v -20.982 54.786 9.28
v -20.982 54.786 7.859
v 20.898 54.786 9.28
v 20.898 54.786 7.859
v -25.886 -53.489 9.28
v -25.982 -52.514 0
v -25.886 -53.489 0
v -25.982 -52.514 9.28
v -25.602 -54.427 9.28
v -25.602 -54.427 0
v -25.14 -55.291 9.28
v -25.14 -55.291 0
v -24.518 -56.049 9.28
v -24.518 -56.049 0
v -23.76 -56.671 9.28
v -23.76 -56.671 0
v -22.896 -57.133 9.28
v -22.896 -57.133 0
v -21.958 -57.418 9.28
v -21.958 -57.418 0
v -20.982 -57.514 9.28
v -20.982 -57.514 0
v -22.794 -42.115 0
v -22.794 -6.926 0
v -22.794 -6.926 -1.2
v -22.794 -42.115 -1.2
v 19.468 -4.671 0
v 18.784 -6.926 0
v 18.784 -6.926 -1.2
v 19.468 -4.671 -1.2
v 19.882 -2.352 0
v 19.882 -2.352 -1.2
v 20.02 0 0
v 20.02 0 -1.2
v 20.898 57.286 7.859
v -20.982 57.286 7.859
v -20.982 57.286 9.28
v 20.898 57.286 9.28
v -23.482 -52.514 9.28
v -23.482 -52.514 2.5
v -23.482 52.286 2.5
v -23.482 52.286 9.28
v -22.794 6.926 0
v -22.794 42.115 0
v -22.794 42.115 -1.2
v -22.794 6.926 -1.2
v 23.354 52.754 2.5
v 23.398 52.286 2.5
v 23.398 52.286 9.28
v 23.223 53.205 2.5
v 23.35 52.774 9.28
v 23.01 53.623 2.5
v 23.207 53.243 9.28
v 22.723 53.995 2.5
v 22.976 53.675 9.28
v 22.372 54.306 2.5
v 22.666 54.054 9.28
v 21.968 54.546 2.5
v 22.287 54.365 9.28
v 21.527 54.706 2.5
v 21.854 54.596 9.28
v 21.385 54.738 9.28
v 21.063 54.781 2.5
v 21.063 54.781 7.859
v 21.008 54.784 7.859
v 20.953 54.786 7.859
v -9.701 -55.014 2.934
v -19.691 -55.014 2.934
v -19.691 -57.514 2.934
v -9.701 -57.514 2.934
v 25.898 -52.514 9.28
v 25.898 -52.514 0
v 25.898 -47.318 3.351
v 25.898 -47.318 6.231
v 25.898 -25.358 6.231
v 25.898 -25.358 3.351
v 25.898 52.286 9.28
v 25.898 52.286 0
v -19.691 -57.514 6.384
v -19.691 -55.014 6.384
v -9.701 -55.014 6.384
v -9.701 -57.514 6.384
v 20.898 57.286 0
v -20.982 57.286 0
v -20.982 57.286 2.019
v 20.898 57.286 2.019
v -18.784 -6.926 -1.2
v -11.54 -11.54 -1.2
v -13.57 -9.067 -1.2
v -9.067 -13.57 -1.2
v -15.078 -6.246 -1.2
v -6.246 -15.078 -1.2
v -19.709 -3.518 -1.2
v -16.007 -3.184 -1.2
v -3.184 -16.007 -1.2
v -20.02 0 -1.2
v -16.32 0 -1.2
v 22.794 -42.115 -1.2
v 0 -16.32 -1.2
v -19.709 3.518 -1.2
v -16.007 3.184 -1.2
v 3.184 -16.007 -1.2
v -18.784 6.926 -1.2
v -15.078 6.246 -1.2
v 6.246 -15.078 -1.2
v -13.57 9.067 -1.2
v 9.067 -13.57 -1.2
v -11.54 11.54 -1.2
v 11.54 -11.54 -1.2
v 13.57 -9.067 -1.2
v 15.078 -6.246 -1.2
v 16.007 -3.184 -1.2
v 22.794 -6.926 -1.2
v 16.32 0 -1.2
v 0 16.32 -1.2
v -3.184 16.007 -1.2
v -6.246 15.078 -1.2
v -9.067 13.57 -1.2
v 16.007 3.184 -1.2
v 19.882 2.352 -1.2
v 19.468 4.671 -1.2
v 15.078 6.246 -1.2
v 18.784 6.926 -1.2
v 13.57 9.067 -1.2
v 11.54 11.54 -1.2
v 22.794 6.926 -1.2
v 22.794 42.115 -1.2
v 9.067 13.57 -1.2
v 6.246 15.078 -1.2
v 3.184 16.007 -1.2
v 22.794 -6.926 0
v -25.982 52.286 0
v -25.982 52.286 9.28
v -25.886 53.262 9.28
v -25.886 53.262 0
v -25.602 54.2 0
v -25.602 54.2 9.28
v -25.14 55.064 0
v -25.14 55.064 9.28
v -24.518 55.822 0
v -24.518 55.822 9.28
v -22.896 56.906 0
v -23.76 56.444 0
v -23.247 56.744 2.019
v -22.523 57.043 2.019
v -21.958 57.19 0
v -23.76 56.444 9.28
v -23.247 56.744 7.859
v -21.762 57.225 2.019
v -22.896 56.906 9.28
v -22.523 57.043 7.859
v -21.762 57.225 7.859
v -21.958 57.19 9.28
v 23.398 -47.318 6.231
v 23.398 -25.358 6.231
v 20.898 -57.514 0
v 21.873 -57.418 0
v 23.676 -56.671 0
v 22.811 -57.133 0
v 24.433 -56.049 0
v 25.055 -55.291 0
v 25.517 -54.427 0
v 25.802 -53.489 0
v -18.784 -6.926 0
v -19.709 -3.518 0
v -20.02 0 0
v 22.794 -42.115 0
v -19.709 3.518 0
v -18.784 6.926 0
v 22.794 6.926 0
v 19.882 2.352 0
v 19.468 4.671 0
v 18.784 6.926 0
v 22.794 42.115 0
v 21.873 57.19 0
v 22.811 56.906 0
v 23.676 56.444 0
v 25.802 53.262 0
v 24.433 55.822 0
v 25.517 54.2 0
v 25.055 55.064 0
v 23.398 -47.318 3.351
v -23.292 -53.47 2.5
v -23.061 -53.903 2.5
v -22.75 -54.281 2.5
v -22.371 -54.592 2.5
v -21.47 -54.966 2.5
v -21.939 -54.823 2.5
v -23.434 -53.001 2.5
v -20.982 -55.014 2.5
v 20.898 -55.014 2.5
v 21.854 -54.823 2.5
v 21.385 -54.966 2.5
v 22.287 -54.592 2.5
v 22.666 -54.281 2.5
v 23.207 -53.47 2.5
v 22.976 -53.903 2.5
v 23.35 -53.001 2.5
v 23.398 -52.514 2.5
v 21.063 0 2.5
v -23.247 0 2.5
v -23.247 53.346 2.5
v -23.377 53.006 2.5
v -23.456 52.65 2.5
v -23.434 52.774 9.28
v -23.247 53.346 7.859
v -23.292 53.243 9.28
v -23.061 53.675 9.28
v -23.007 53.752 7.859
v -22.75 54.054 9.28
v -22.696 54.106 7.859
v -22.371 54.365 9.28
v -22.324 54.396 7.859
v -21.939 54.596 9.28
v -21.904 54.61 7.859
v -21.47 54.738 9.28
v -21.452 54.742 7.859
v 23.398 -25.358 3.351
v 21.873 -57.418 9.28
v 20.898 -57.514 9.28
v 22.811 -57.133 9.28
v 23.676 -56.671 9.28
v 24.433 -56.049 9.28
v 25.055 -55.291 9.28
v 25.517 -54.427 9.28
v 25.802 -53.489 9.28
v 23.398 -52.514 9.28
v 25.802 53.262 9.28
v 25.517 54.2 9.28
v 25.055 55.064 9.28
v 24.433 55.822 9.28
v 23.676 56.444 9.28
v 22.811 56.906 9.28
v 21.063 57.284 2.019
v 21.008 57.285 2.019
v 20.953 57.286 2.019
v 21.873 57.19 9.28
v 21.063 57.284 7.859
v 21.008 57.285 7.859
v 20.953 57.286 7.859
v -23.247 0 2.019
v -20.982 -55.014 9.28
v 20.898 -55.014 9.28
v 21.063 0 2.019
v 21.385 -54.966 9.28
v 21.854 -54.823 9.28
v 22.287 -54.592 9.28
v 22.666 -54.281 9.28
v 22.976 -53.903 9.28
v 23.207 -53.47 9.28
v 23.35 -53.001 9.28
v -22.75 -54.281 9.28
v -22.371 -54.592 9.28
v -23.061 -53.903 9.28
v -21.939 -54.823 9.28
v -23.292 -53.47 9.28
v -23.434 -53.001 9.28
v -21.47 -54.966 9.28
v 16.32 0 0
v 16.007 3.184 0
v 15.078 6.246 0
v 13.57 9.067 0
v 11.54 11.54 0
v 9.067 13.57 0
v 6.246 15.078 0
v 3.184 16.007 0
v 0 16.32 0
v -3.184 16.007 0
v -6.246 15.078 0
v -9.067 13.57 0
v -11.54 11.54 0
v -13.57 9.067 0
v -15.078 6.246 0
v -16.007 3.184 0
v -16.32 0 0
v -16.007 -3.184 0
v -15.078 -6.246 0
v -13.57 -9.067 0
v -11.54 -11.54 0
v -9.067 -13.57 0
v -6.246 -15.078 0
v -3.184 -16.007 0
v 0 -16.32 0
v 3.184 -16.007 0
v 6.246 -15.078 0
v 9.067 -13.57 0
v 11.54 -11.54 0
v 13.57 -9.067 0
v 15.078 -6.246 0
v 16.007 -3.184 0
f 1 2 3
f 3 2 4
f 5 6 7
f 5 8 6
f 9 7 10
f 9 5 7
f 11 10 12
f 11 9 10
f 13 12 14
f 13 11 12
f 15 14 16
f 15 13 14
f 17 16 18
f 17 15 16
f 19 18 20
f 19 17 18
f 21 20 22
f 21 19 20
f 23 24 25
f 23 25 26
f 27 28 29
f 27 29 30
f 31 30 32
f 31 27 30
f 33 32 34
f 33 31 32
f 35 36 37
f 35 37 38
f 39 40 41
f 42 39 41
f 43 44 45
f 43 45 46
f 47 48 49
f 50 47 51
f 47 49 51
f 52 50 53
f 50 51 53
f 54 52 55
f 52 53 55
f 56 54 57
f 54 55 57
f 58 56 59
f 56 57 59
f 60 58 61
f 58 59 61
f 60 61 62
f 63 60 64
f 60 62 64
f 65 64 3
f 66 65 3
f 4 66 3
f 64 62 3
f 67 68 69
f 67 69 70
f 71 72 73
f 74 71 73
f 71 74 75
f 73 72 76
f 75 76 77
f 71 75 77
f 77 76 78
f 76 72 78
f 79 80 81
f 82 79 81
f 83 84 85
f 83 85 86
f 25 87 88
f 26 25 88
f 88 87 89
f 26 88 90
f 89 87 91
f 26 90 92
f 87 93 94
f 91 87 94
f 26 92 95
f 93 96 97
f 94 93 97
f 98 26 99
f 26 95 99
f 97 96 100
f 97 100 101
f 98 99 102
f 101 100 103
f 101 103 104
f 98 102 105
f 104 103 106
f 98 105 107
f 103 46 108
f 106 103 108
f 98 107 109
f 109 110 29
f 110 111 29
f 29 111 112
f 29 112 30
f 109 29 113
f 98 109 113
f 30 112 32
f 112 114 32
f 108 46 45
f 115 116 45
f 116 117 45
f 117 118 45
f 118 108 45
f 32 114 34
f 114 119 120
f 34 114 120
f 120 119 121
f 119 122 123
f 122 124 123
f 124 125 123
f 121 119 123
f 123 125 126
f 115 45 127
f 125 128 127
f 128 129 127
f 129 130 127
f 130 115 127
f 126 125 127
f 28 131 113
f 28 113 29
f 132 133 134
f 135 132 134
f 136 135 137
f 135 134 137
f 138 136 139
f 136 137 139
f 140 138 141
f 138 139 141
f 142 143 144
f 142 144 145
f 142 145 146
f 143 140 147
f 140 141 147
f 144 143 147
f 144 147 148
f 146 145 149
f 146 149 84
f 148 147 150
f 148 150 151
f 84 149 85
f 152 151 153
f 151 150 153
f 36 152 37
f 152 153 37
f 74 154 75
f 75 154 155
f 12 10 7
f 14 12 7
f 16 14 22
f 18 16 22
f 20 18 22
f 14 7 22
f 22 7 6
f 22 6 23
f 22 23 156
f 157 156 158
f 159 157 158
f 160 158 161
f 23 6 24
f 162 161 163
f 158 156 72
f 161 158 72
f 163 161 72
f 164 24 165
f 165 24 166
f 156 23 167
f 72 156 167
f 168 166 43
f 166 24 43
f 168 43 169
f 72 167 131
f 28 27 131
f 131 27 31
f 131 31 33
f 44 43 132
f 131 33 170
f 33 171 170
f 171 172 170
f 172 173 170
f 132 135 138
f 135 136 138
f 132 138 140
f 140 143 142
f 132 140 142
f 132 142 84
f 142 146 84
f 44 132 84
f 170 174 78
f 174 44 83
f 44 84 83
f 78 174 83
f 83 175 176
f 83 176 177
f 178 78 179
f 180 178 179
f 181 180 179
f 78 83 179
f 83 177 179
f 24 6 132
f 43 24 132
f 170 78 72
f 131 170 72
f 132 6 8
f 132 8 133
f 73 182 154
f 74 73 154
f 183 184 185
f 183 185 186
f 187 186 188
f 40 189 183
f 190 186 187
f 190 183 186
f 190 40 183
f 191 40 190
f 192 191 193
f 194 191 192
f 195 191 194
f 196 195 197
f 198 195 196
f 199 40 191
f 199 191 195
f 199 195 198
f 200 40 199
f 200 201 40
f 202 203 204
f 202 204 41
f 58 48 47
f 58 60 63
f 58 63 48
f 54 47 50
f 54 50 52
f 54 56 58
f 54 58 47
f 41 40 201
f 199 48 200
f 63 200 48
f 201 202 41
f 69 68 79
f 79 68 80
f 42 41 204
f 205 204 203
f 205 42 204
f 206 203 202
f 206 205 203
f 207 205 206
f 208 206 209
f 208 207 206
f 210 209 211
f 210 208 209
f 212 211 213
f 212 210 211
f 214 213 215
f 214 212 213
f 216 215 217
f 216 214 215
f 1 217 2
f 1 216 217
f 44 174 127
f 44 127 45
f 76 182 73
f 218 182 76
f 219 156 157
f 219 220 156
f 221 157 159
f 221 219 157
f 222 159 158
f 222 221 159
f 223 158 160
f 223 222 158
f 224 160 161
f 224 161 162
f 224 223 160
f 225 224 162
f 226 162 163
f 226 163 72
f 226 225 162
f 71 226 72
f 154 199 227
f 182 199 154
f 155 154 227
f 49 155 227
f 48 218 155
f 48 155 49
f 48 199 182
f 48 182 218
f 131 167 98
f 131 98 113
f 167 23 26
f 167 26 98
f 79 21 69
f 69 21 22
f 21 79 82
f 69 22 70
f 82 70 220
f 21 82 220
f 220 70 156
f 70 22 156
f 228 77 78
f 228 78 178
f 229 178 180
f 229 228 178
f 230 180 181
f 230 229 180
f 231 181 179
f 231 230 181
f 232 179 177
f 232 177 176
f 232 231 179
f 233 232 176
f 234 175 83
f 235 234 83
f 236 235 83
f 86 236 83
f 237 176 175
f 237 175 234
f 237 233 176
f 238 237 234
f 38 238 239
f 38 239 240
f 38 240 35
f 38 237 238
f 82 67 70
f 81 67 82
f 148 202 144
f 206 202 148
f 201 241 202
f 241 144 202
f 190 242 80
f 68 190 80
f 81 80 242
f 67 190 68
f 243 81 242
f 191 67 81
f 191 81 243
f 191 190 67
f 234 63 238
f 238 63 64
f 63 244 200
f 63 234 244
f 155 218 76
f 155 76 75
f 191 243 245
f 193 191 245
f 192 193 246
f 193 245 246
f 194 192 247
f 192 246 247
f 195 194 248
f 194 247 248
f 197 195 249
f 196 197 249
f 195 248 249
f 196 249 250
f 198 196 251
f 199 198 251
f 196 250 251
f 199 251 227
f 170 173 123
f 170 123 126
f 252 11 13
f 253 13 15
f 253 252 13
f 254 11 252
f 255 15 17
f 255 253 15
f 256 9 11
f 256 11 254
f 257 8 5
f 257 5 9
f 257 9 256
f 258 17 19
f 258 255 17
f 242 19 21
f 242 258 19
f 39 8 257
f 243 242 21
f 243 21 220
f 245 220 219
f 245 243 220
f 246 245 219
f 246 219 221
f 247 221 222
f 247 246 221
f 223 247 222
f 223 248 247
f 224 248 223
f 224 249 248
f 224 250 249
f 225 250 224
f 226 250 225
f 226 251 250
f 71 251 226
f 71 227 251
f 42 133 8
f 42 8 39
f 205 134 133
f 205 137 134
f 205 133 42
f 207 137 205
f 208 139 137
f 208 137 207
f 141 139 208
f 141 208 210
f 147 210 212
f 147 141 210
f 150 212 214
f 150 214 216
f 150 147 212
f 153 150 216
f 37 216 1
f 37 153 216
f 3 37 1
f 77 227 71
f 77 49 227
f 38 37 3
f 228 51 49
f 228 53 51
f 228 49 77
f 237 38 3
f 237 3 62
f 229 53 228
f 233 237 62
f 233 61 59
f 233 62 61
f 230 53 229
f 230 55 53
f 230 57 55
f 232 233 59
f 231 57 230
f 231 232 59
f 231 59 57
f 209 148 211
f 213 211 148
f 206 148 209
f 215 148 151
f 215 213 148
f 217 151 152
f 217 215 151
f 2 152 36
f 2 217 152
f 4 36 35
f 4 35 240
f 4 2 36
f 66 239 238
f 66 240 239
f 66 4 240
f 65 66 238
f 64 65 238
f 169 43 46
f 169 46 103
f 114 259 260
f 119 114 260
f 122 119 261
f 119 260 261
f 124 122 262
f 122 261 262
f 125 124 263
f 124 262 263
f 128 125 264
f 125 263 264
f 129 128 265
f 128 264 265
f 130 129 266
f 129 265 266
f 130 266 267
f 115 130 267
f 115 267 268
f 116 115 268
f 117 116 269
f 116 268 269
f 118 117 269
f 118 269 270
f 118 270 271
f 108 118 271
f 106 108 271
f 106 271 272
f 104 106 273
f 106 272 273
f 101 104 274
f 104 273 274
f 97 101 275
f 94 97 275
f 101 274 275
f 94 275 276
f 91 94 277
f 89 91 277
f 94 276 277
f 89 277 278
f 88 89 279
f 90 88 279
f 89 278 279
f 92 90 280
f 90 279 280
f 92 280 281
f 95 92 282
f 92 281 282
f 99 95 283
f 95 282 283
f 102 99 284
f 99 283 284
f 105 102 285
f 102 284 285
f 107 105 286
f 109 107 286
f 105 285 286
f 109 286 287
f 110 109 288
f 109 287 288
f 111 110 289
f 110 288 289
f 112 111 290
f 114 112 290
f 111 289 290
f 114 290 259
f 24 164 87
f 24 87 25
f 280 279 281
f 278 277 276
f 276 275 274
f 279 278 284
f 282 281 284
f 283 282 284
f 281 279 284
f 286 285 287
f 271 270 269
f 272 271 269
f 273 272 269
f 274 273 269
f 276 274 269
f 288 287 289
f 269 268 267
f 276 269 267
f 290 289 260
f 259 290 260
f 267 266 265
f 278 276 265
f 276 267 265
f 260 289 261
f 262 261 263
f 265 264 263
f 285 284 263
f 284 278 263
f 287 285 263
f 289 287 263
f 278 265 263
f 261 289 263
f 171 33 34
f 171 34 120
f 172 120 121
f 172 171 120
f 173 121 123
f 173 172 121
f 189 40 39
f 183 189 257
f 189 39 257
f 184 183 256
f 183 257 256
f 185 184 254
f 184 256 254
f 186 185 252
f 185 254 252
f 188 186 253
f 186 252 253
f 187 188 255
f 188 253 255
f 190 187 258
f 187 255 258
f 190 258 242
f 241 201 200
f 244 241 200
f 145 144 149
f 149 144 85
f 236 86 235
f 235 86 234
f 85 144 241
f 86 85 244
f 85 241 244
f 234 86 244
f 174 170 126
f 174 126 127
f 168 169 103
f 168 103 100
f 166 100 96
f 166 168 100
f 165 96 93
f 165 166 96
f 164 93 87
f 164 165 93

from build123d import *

# Parameters (mm, degrees)
F0_W      = 51.88
F0_H      = 114.8
F1_DEPTH  = 9.28
F2_R      = 5
F3_T      = -2.5
F4_W      = 9.99
F4_H      = 3.45
F5_DEPTH  = 69.5
F6_W      = 21.96
F6_H      = 2.88
F7_DEPTH  = 36.6
F8_W      = 44.31
F8_H      = 5.84
F9_DEPTH  = 65.7
F10_R     = 16.320489
F11_DEPTH = 1.2


with BuildPart() as f1:
    # F0 (on Top) → F1 (new body)
    with BuildSketch(Plane.XY):
        with Locations((-0.042248, -0.113639)):
            Rectangle(F0_W, F0_H)
    extrude(amount=F1_DEPTH)

    # F2
    f2_edges = [f1.edges().sort_by_distance(p)[0] for p in [
        (25.897752, 57.286361, 4.64),
        (25.897752, -57.513639, 4.64),
        (-25.982248, 57.286361, 4.64),
        (-25.982248, -57.513639, 4.64),
    ]]
    fillet(f2_edges, radius=F2_R)

    # F3
    f3_openings = [f1.faces().sort_by_distance(p)[0] for p in [
        (-0.042248, -0.113639, 9.28),
    ]]
    offset(amount=F3_T, openings=f3_openings)

    # F4 (on Front) → F5 (cut)
    with BuildSketch(Plane.XZ):
        with Locations((-14.695825, 4.658578)):
            Rectangle(F4_W, F4_H)
    extrude(amount=F5_DEPTH, mode=Mode.SUBTRACT)

    # F6 (on Right) → F7 (cut)
    with BuildSketch(Plane.YZ):
        with Locations((-36.337859, 4.790666)):
            Rectangle(F6_W, F6_H)
    extrude(amount=F7_DEPTH, mode=Mode.SUBTRACT)

    # F8 (on Front) → F9 (cut)
    with BuildSketch(Plane.XZ):
        with Locations((-1.091603, 4.939306)):
            Rectangle(F8_W, F8_H)
    extrude(amount=-F9_DEPTH, mode=Mode.SUBTRACT)

    # F10 (on Top) → F11 (join)
    with BuildSketch(Plane.XY):
        with BuildLine():
            ThreePointArc((18.784328, -6.925963), (19.709026, -3.517707), (20.020488, 0))
            ThreePointArc((20.020488, 0), (19.709026, 3.517707), (18.784328, 6.925963))
            ThreePointArc((18.784328, 6.925963), (0, 20.020488), (-18.784328, 6.925963))
            ThreePointArc((-18.784328, 6.925963), (-20.020488, 0), (-18.784328, -6.925963))
            ThreePointArc((-18.784328, -6.925963), (0, -20.020488), (18.784328, -6.925963))
        make_face()
        Circle(F10_R, mode=Mode.SUBTRACT)
        with BuildLine():
            ThreePointArc((-18.784328, 6.925963), (0, 20.020488), (18.784328, 6.925963))
            Line((18.784328, 6.925963), (22.793854, 6.925963))
            Line((22.793854, 6.925963), (22.793854, 42.115439))
            Line((22.793854, 42.115439), (0, 42.115439))
            Line((0, 42.115439), (-22.793854, 42.115439))
            Line((-22.793854, 42.115439), (-22.793854, 6.925963))
            Line((-22.793854, 6.925963), (-18.784328, 6.925963))
        make_face()
        with BuildLine():
            Line((22.793854, -6.925963), (18.784328, -6.925963))
            ThreePointArc((18.784328, -6.925963), (0, -20.020488), (-18.784328, -6.925963))
            Line((-18.784328, -6.925963), (-22.793854, -6.925963))
            Line((-22.793854, -6.925963), (-22.793854, -42.115439))
            Line((-22.793854, -42.115439), (0, -42.115439))
            Line((0, -42.115439), (22.793854, -42.115439))
            Line((22.793854, -42.115439), (22.793854, -6.925963))
        make_face()
    extrude(amount=-F11_DEPTH)


solid = f1.part
